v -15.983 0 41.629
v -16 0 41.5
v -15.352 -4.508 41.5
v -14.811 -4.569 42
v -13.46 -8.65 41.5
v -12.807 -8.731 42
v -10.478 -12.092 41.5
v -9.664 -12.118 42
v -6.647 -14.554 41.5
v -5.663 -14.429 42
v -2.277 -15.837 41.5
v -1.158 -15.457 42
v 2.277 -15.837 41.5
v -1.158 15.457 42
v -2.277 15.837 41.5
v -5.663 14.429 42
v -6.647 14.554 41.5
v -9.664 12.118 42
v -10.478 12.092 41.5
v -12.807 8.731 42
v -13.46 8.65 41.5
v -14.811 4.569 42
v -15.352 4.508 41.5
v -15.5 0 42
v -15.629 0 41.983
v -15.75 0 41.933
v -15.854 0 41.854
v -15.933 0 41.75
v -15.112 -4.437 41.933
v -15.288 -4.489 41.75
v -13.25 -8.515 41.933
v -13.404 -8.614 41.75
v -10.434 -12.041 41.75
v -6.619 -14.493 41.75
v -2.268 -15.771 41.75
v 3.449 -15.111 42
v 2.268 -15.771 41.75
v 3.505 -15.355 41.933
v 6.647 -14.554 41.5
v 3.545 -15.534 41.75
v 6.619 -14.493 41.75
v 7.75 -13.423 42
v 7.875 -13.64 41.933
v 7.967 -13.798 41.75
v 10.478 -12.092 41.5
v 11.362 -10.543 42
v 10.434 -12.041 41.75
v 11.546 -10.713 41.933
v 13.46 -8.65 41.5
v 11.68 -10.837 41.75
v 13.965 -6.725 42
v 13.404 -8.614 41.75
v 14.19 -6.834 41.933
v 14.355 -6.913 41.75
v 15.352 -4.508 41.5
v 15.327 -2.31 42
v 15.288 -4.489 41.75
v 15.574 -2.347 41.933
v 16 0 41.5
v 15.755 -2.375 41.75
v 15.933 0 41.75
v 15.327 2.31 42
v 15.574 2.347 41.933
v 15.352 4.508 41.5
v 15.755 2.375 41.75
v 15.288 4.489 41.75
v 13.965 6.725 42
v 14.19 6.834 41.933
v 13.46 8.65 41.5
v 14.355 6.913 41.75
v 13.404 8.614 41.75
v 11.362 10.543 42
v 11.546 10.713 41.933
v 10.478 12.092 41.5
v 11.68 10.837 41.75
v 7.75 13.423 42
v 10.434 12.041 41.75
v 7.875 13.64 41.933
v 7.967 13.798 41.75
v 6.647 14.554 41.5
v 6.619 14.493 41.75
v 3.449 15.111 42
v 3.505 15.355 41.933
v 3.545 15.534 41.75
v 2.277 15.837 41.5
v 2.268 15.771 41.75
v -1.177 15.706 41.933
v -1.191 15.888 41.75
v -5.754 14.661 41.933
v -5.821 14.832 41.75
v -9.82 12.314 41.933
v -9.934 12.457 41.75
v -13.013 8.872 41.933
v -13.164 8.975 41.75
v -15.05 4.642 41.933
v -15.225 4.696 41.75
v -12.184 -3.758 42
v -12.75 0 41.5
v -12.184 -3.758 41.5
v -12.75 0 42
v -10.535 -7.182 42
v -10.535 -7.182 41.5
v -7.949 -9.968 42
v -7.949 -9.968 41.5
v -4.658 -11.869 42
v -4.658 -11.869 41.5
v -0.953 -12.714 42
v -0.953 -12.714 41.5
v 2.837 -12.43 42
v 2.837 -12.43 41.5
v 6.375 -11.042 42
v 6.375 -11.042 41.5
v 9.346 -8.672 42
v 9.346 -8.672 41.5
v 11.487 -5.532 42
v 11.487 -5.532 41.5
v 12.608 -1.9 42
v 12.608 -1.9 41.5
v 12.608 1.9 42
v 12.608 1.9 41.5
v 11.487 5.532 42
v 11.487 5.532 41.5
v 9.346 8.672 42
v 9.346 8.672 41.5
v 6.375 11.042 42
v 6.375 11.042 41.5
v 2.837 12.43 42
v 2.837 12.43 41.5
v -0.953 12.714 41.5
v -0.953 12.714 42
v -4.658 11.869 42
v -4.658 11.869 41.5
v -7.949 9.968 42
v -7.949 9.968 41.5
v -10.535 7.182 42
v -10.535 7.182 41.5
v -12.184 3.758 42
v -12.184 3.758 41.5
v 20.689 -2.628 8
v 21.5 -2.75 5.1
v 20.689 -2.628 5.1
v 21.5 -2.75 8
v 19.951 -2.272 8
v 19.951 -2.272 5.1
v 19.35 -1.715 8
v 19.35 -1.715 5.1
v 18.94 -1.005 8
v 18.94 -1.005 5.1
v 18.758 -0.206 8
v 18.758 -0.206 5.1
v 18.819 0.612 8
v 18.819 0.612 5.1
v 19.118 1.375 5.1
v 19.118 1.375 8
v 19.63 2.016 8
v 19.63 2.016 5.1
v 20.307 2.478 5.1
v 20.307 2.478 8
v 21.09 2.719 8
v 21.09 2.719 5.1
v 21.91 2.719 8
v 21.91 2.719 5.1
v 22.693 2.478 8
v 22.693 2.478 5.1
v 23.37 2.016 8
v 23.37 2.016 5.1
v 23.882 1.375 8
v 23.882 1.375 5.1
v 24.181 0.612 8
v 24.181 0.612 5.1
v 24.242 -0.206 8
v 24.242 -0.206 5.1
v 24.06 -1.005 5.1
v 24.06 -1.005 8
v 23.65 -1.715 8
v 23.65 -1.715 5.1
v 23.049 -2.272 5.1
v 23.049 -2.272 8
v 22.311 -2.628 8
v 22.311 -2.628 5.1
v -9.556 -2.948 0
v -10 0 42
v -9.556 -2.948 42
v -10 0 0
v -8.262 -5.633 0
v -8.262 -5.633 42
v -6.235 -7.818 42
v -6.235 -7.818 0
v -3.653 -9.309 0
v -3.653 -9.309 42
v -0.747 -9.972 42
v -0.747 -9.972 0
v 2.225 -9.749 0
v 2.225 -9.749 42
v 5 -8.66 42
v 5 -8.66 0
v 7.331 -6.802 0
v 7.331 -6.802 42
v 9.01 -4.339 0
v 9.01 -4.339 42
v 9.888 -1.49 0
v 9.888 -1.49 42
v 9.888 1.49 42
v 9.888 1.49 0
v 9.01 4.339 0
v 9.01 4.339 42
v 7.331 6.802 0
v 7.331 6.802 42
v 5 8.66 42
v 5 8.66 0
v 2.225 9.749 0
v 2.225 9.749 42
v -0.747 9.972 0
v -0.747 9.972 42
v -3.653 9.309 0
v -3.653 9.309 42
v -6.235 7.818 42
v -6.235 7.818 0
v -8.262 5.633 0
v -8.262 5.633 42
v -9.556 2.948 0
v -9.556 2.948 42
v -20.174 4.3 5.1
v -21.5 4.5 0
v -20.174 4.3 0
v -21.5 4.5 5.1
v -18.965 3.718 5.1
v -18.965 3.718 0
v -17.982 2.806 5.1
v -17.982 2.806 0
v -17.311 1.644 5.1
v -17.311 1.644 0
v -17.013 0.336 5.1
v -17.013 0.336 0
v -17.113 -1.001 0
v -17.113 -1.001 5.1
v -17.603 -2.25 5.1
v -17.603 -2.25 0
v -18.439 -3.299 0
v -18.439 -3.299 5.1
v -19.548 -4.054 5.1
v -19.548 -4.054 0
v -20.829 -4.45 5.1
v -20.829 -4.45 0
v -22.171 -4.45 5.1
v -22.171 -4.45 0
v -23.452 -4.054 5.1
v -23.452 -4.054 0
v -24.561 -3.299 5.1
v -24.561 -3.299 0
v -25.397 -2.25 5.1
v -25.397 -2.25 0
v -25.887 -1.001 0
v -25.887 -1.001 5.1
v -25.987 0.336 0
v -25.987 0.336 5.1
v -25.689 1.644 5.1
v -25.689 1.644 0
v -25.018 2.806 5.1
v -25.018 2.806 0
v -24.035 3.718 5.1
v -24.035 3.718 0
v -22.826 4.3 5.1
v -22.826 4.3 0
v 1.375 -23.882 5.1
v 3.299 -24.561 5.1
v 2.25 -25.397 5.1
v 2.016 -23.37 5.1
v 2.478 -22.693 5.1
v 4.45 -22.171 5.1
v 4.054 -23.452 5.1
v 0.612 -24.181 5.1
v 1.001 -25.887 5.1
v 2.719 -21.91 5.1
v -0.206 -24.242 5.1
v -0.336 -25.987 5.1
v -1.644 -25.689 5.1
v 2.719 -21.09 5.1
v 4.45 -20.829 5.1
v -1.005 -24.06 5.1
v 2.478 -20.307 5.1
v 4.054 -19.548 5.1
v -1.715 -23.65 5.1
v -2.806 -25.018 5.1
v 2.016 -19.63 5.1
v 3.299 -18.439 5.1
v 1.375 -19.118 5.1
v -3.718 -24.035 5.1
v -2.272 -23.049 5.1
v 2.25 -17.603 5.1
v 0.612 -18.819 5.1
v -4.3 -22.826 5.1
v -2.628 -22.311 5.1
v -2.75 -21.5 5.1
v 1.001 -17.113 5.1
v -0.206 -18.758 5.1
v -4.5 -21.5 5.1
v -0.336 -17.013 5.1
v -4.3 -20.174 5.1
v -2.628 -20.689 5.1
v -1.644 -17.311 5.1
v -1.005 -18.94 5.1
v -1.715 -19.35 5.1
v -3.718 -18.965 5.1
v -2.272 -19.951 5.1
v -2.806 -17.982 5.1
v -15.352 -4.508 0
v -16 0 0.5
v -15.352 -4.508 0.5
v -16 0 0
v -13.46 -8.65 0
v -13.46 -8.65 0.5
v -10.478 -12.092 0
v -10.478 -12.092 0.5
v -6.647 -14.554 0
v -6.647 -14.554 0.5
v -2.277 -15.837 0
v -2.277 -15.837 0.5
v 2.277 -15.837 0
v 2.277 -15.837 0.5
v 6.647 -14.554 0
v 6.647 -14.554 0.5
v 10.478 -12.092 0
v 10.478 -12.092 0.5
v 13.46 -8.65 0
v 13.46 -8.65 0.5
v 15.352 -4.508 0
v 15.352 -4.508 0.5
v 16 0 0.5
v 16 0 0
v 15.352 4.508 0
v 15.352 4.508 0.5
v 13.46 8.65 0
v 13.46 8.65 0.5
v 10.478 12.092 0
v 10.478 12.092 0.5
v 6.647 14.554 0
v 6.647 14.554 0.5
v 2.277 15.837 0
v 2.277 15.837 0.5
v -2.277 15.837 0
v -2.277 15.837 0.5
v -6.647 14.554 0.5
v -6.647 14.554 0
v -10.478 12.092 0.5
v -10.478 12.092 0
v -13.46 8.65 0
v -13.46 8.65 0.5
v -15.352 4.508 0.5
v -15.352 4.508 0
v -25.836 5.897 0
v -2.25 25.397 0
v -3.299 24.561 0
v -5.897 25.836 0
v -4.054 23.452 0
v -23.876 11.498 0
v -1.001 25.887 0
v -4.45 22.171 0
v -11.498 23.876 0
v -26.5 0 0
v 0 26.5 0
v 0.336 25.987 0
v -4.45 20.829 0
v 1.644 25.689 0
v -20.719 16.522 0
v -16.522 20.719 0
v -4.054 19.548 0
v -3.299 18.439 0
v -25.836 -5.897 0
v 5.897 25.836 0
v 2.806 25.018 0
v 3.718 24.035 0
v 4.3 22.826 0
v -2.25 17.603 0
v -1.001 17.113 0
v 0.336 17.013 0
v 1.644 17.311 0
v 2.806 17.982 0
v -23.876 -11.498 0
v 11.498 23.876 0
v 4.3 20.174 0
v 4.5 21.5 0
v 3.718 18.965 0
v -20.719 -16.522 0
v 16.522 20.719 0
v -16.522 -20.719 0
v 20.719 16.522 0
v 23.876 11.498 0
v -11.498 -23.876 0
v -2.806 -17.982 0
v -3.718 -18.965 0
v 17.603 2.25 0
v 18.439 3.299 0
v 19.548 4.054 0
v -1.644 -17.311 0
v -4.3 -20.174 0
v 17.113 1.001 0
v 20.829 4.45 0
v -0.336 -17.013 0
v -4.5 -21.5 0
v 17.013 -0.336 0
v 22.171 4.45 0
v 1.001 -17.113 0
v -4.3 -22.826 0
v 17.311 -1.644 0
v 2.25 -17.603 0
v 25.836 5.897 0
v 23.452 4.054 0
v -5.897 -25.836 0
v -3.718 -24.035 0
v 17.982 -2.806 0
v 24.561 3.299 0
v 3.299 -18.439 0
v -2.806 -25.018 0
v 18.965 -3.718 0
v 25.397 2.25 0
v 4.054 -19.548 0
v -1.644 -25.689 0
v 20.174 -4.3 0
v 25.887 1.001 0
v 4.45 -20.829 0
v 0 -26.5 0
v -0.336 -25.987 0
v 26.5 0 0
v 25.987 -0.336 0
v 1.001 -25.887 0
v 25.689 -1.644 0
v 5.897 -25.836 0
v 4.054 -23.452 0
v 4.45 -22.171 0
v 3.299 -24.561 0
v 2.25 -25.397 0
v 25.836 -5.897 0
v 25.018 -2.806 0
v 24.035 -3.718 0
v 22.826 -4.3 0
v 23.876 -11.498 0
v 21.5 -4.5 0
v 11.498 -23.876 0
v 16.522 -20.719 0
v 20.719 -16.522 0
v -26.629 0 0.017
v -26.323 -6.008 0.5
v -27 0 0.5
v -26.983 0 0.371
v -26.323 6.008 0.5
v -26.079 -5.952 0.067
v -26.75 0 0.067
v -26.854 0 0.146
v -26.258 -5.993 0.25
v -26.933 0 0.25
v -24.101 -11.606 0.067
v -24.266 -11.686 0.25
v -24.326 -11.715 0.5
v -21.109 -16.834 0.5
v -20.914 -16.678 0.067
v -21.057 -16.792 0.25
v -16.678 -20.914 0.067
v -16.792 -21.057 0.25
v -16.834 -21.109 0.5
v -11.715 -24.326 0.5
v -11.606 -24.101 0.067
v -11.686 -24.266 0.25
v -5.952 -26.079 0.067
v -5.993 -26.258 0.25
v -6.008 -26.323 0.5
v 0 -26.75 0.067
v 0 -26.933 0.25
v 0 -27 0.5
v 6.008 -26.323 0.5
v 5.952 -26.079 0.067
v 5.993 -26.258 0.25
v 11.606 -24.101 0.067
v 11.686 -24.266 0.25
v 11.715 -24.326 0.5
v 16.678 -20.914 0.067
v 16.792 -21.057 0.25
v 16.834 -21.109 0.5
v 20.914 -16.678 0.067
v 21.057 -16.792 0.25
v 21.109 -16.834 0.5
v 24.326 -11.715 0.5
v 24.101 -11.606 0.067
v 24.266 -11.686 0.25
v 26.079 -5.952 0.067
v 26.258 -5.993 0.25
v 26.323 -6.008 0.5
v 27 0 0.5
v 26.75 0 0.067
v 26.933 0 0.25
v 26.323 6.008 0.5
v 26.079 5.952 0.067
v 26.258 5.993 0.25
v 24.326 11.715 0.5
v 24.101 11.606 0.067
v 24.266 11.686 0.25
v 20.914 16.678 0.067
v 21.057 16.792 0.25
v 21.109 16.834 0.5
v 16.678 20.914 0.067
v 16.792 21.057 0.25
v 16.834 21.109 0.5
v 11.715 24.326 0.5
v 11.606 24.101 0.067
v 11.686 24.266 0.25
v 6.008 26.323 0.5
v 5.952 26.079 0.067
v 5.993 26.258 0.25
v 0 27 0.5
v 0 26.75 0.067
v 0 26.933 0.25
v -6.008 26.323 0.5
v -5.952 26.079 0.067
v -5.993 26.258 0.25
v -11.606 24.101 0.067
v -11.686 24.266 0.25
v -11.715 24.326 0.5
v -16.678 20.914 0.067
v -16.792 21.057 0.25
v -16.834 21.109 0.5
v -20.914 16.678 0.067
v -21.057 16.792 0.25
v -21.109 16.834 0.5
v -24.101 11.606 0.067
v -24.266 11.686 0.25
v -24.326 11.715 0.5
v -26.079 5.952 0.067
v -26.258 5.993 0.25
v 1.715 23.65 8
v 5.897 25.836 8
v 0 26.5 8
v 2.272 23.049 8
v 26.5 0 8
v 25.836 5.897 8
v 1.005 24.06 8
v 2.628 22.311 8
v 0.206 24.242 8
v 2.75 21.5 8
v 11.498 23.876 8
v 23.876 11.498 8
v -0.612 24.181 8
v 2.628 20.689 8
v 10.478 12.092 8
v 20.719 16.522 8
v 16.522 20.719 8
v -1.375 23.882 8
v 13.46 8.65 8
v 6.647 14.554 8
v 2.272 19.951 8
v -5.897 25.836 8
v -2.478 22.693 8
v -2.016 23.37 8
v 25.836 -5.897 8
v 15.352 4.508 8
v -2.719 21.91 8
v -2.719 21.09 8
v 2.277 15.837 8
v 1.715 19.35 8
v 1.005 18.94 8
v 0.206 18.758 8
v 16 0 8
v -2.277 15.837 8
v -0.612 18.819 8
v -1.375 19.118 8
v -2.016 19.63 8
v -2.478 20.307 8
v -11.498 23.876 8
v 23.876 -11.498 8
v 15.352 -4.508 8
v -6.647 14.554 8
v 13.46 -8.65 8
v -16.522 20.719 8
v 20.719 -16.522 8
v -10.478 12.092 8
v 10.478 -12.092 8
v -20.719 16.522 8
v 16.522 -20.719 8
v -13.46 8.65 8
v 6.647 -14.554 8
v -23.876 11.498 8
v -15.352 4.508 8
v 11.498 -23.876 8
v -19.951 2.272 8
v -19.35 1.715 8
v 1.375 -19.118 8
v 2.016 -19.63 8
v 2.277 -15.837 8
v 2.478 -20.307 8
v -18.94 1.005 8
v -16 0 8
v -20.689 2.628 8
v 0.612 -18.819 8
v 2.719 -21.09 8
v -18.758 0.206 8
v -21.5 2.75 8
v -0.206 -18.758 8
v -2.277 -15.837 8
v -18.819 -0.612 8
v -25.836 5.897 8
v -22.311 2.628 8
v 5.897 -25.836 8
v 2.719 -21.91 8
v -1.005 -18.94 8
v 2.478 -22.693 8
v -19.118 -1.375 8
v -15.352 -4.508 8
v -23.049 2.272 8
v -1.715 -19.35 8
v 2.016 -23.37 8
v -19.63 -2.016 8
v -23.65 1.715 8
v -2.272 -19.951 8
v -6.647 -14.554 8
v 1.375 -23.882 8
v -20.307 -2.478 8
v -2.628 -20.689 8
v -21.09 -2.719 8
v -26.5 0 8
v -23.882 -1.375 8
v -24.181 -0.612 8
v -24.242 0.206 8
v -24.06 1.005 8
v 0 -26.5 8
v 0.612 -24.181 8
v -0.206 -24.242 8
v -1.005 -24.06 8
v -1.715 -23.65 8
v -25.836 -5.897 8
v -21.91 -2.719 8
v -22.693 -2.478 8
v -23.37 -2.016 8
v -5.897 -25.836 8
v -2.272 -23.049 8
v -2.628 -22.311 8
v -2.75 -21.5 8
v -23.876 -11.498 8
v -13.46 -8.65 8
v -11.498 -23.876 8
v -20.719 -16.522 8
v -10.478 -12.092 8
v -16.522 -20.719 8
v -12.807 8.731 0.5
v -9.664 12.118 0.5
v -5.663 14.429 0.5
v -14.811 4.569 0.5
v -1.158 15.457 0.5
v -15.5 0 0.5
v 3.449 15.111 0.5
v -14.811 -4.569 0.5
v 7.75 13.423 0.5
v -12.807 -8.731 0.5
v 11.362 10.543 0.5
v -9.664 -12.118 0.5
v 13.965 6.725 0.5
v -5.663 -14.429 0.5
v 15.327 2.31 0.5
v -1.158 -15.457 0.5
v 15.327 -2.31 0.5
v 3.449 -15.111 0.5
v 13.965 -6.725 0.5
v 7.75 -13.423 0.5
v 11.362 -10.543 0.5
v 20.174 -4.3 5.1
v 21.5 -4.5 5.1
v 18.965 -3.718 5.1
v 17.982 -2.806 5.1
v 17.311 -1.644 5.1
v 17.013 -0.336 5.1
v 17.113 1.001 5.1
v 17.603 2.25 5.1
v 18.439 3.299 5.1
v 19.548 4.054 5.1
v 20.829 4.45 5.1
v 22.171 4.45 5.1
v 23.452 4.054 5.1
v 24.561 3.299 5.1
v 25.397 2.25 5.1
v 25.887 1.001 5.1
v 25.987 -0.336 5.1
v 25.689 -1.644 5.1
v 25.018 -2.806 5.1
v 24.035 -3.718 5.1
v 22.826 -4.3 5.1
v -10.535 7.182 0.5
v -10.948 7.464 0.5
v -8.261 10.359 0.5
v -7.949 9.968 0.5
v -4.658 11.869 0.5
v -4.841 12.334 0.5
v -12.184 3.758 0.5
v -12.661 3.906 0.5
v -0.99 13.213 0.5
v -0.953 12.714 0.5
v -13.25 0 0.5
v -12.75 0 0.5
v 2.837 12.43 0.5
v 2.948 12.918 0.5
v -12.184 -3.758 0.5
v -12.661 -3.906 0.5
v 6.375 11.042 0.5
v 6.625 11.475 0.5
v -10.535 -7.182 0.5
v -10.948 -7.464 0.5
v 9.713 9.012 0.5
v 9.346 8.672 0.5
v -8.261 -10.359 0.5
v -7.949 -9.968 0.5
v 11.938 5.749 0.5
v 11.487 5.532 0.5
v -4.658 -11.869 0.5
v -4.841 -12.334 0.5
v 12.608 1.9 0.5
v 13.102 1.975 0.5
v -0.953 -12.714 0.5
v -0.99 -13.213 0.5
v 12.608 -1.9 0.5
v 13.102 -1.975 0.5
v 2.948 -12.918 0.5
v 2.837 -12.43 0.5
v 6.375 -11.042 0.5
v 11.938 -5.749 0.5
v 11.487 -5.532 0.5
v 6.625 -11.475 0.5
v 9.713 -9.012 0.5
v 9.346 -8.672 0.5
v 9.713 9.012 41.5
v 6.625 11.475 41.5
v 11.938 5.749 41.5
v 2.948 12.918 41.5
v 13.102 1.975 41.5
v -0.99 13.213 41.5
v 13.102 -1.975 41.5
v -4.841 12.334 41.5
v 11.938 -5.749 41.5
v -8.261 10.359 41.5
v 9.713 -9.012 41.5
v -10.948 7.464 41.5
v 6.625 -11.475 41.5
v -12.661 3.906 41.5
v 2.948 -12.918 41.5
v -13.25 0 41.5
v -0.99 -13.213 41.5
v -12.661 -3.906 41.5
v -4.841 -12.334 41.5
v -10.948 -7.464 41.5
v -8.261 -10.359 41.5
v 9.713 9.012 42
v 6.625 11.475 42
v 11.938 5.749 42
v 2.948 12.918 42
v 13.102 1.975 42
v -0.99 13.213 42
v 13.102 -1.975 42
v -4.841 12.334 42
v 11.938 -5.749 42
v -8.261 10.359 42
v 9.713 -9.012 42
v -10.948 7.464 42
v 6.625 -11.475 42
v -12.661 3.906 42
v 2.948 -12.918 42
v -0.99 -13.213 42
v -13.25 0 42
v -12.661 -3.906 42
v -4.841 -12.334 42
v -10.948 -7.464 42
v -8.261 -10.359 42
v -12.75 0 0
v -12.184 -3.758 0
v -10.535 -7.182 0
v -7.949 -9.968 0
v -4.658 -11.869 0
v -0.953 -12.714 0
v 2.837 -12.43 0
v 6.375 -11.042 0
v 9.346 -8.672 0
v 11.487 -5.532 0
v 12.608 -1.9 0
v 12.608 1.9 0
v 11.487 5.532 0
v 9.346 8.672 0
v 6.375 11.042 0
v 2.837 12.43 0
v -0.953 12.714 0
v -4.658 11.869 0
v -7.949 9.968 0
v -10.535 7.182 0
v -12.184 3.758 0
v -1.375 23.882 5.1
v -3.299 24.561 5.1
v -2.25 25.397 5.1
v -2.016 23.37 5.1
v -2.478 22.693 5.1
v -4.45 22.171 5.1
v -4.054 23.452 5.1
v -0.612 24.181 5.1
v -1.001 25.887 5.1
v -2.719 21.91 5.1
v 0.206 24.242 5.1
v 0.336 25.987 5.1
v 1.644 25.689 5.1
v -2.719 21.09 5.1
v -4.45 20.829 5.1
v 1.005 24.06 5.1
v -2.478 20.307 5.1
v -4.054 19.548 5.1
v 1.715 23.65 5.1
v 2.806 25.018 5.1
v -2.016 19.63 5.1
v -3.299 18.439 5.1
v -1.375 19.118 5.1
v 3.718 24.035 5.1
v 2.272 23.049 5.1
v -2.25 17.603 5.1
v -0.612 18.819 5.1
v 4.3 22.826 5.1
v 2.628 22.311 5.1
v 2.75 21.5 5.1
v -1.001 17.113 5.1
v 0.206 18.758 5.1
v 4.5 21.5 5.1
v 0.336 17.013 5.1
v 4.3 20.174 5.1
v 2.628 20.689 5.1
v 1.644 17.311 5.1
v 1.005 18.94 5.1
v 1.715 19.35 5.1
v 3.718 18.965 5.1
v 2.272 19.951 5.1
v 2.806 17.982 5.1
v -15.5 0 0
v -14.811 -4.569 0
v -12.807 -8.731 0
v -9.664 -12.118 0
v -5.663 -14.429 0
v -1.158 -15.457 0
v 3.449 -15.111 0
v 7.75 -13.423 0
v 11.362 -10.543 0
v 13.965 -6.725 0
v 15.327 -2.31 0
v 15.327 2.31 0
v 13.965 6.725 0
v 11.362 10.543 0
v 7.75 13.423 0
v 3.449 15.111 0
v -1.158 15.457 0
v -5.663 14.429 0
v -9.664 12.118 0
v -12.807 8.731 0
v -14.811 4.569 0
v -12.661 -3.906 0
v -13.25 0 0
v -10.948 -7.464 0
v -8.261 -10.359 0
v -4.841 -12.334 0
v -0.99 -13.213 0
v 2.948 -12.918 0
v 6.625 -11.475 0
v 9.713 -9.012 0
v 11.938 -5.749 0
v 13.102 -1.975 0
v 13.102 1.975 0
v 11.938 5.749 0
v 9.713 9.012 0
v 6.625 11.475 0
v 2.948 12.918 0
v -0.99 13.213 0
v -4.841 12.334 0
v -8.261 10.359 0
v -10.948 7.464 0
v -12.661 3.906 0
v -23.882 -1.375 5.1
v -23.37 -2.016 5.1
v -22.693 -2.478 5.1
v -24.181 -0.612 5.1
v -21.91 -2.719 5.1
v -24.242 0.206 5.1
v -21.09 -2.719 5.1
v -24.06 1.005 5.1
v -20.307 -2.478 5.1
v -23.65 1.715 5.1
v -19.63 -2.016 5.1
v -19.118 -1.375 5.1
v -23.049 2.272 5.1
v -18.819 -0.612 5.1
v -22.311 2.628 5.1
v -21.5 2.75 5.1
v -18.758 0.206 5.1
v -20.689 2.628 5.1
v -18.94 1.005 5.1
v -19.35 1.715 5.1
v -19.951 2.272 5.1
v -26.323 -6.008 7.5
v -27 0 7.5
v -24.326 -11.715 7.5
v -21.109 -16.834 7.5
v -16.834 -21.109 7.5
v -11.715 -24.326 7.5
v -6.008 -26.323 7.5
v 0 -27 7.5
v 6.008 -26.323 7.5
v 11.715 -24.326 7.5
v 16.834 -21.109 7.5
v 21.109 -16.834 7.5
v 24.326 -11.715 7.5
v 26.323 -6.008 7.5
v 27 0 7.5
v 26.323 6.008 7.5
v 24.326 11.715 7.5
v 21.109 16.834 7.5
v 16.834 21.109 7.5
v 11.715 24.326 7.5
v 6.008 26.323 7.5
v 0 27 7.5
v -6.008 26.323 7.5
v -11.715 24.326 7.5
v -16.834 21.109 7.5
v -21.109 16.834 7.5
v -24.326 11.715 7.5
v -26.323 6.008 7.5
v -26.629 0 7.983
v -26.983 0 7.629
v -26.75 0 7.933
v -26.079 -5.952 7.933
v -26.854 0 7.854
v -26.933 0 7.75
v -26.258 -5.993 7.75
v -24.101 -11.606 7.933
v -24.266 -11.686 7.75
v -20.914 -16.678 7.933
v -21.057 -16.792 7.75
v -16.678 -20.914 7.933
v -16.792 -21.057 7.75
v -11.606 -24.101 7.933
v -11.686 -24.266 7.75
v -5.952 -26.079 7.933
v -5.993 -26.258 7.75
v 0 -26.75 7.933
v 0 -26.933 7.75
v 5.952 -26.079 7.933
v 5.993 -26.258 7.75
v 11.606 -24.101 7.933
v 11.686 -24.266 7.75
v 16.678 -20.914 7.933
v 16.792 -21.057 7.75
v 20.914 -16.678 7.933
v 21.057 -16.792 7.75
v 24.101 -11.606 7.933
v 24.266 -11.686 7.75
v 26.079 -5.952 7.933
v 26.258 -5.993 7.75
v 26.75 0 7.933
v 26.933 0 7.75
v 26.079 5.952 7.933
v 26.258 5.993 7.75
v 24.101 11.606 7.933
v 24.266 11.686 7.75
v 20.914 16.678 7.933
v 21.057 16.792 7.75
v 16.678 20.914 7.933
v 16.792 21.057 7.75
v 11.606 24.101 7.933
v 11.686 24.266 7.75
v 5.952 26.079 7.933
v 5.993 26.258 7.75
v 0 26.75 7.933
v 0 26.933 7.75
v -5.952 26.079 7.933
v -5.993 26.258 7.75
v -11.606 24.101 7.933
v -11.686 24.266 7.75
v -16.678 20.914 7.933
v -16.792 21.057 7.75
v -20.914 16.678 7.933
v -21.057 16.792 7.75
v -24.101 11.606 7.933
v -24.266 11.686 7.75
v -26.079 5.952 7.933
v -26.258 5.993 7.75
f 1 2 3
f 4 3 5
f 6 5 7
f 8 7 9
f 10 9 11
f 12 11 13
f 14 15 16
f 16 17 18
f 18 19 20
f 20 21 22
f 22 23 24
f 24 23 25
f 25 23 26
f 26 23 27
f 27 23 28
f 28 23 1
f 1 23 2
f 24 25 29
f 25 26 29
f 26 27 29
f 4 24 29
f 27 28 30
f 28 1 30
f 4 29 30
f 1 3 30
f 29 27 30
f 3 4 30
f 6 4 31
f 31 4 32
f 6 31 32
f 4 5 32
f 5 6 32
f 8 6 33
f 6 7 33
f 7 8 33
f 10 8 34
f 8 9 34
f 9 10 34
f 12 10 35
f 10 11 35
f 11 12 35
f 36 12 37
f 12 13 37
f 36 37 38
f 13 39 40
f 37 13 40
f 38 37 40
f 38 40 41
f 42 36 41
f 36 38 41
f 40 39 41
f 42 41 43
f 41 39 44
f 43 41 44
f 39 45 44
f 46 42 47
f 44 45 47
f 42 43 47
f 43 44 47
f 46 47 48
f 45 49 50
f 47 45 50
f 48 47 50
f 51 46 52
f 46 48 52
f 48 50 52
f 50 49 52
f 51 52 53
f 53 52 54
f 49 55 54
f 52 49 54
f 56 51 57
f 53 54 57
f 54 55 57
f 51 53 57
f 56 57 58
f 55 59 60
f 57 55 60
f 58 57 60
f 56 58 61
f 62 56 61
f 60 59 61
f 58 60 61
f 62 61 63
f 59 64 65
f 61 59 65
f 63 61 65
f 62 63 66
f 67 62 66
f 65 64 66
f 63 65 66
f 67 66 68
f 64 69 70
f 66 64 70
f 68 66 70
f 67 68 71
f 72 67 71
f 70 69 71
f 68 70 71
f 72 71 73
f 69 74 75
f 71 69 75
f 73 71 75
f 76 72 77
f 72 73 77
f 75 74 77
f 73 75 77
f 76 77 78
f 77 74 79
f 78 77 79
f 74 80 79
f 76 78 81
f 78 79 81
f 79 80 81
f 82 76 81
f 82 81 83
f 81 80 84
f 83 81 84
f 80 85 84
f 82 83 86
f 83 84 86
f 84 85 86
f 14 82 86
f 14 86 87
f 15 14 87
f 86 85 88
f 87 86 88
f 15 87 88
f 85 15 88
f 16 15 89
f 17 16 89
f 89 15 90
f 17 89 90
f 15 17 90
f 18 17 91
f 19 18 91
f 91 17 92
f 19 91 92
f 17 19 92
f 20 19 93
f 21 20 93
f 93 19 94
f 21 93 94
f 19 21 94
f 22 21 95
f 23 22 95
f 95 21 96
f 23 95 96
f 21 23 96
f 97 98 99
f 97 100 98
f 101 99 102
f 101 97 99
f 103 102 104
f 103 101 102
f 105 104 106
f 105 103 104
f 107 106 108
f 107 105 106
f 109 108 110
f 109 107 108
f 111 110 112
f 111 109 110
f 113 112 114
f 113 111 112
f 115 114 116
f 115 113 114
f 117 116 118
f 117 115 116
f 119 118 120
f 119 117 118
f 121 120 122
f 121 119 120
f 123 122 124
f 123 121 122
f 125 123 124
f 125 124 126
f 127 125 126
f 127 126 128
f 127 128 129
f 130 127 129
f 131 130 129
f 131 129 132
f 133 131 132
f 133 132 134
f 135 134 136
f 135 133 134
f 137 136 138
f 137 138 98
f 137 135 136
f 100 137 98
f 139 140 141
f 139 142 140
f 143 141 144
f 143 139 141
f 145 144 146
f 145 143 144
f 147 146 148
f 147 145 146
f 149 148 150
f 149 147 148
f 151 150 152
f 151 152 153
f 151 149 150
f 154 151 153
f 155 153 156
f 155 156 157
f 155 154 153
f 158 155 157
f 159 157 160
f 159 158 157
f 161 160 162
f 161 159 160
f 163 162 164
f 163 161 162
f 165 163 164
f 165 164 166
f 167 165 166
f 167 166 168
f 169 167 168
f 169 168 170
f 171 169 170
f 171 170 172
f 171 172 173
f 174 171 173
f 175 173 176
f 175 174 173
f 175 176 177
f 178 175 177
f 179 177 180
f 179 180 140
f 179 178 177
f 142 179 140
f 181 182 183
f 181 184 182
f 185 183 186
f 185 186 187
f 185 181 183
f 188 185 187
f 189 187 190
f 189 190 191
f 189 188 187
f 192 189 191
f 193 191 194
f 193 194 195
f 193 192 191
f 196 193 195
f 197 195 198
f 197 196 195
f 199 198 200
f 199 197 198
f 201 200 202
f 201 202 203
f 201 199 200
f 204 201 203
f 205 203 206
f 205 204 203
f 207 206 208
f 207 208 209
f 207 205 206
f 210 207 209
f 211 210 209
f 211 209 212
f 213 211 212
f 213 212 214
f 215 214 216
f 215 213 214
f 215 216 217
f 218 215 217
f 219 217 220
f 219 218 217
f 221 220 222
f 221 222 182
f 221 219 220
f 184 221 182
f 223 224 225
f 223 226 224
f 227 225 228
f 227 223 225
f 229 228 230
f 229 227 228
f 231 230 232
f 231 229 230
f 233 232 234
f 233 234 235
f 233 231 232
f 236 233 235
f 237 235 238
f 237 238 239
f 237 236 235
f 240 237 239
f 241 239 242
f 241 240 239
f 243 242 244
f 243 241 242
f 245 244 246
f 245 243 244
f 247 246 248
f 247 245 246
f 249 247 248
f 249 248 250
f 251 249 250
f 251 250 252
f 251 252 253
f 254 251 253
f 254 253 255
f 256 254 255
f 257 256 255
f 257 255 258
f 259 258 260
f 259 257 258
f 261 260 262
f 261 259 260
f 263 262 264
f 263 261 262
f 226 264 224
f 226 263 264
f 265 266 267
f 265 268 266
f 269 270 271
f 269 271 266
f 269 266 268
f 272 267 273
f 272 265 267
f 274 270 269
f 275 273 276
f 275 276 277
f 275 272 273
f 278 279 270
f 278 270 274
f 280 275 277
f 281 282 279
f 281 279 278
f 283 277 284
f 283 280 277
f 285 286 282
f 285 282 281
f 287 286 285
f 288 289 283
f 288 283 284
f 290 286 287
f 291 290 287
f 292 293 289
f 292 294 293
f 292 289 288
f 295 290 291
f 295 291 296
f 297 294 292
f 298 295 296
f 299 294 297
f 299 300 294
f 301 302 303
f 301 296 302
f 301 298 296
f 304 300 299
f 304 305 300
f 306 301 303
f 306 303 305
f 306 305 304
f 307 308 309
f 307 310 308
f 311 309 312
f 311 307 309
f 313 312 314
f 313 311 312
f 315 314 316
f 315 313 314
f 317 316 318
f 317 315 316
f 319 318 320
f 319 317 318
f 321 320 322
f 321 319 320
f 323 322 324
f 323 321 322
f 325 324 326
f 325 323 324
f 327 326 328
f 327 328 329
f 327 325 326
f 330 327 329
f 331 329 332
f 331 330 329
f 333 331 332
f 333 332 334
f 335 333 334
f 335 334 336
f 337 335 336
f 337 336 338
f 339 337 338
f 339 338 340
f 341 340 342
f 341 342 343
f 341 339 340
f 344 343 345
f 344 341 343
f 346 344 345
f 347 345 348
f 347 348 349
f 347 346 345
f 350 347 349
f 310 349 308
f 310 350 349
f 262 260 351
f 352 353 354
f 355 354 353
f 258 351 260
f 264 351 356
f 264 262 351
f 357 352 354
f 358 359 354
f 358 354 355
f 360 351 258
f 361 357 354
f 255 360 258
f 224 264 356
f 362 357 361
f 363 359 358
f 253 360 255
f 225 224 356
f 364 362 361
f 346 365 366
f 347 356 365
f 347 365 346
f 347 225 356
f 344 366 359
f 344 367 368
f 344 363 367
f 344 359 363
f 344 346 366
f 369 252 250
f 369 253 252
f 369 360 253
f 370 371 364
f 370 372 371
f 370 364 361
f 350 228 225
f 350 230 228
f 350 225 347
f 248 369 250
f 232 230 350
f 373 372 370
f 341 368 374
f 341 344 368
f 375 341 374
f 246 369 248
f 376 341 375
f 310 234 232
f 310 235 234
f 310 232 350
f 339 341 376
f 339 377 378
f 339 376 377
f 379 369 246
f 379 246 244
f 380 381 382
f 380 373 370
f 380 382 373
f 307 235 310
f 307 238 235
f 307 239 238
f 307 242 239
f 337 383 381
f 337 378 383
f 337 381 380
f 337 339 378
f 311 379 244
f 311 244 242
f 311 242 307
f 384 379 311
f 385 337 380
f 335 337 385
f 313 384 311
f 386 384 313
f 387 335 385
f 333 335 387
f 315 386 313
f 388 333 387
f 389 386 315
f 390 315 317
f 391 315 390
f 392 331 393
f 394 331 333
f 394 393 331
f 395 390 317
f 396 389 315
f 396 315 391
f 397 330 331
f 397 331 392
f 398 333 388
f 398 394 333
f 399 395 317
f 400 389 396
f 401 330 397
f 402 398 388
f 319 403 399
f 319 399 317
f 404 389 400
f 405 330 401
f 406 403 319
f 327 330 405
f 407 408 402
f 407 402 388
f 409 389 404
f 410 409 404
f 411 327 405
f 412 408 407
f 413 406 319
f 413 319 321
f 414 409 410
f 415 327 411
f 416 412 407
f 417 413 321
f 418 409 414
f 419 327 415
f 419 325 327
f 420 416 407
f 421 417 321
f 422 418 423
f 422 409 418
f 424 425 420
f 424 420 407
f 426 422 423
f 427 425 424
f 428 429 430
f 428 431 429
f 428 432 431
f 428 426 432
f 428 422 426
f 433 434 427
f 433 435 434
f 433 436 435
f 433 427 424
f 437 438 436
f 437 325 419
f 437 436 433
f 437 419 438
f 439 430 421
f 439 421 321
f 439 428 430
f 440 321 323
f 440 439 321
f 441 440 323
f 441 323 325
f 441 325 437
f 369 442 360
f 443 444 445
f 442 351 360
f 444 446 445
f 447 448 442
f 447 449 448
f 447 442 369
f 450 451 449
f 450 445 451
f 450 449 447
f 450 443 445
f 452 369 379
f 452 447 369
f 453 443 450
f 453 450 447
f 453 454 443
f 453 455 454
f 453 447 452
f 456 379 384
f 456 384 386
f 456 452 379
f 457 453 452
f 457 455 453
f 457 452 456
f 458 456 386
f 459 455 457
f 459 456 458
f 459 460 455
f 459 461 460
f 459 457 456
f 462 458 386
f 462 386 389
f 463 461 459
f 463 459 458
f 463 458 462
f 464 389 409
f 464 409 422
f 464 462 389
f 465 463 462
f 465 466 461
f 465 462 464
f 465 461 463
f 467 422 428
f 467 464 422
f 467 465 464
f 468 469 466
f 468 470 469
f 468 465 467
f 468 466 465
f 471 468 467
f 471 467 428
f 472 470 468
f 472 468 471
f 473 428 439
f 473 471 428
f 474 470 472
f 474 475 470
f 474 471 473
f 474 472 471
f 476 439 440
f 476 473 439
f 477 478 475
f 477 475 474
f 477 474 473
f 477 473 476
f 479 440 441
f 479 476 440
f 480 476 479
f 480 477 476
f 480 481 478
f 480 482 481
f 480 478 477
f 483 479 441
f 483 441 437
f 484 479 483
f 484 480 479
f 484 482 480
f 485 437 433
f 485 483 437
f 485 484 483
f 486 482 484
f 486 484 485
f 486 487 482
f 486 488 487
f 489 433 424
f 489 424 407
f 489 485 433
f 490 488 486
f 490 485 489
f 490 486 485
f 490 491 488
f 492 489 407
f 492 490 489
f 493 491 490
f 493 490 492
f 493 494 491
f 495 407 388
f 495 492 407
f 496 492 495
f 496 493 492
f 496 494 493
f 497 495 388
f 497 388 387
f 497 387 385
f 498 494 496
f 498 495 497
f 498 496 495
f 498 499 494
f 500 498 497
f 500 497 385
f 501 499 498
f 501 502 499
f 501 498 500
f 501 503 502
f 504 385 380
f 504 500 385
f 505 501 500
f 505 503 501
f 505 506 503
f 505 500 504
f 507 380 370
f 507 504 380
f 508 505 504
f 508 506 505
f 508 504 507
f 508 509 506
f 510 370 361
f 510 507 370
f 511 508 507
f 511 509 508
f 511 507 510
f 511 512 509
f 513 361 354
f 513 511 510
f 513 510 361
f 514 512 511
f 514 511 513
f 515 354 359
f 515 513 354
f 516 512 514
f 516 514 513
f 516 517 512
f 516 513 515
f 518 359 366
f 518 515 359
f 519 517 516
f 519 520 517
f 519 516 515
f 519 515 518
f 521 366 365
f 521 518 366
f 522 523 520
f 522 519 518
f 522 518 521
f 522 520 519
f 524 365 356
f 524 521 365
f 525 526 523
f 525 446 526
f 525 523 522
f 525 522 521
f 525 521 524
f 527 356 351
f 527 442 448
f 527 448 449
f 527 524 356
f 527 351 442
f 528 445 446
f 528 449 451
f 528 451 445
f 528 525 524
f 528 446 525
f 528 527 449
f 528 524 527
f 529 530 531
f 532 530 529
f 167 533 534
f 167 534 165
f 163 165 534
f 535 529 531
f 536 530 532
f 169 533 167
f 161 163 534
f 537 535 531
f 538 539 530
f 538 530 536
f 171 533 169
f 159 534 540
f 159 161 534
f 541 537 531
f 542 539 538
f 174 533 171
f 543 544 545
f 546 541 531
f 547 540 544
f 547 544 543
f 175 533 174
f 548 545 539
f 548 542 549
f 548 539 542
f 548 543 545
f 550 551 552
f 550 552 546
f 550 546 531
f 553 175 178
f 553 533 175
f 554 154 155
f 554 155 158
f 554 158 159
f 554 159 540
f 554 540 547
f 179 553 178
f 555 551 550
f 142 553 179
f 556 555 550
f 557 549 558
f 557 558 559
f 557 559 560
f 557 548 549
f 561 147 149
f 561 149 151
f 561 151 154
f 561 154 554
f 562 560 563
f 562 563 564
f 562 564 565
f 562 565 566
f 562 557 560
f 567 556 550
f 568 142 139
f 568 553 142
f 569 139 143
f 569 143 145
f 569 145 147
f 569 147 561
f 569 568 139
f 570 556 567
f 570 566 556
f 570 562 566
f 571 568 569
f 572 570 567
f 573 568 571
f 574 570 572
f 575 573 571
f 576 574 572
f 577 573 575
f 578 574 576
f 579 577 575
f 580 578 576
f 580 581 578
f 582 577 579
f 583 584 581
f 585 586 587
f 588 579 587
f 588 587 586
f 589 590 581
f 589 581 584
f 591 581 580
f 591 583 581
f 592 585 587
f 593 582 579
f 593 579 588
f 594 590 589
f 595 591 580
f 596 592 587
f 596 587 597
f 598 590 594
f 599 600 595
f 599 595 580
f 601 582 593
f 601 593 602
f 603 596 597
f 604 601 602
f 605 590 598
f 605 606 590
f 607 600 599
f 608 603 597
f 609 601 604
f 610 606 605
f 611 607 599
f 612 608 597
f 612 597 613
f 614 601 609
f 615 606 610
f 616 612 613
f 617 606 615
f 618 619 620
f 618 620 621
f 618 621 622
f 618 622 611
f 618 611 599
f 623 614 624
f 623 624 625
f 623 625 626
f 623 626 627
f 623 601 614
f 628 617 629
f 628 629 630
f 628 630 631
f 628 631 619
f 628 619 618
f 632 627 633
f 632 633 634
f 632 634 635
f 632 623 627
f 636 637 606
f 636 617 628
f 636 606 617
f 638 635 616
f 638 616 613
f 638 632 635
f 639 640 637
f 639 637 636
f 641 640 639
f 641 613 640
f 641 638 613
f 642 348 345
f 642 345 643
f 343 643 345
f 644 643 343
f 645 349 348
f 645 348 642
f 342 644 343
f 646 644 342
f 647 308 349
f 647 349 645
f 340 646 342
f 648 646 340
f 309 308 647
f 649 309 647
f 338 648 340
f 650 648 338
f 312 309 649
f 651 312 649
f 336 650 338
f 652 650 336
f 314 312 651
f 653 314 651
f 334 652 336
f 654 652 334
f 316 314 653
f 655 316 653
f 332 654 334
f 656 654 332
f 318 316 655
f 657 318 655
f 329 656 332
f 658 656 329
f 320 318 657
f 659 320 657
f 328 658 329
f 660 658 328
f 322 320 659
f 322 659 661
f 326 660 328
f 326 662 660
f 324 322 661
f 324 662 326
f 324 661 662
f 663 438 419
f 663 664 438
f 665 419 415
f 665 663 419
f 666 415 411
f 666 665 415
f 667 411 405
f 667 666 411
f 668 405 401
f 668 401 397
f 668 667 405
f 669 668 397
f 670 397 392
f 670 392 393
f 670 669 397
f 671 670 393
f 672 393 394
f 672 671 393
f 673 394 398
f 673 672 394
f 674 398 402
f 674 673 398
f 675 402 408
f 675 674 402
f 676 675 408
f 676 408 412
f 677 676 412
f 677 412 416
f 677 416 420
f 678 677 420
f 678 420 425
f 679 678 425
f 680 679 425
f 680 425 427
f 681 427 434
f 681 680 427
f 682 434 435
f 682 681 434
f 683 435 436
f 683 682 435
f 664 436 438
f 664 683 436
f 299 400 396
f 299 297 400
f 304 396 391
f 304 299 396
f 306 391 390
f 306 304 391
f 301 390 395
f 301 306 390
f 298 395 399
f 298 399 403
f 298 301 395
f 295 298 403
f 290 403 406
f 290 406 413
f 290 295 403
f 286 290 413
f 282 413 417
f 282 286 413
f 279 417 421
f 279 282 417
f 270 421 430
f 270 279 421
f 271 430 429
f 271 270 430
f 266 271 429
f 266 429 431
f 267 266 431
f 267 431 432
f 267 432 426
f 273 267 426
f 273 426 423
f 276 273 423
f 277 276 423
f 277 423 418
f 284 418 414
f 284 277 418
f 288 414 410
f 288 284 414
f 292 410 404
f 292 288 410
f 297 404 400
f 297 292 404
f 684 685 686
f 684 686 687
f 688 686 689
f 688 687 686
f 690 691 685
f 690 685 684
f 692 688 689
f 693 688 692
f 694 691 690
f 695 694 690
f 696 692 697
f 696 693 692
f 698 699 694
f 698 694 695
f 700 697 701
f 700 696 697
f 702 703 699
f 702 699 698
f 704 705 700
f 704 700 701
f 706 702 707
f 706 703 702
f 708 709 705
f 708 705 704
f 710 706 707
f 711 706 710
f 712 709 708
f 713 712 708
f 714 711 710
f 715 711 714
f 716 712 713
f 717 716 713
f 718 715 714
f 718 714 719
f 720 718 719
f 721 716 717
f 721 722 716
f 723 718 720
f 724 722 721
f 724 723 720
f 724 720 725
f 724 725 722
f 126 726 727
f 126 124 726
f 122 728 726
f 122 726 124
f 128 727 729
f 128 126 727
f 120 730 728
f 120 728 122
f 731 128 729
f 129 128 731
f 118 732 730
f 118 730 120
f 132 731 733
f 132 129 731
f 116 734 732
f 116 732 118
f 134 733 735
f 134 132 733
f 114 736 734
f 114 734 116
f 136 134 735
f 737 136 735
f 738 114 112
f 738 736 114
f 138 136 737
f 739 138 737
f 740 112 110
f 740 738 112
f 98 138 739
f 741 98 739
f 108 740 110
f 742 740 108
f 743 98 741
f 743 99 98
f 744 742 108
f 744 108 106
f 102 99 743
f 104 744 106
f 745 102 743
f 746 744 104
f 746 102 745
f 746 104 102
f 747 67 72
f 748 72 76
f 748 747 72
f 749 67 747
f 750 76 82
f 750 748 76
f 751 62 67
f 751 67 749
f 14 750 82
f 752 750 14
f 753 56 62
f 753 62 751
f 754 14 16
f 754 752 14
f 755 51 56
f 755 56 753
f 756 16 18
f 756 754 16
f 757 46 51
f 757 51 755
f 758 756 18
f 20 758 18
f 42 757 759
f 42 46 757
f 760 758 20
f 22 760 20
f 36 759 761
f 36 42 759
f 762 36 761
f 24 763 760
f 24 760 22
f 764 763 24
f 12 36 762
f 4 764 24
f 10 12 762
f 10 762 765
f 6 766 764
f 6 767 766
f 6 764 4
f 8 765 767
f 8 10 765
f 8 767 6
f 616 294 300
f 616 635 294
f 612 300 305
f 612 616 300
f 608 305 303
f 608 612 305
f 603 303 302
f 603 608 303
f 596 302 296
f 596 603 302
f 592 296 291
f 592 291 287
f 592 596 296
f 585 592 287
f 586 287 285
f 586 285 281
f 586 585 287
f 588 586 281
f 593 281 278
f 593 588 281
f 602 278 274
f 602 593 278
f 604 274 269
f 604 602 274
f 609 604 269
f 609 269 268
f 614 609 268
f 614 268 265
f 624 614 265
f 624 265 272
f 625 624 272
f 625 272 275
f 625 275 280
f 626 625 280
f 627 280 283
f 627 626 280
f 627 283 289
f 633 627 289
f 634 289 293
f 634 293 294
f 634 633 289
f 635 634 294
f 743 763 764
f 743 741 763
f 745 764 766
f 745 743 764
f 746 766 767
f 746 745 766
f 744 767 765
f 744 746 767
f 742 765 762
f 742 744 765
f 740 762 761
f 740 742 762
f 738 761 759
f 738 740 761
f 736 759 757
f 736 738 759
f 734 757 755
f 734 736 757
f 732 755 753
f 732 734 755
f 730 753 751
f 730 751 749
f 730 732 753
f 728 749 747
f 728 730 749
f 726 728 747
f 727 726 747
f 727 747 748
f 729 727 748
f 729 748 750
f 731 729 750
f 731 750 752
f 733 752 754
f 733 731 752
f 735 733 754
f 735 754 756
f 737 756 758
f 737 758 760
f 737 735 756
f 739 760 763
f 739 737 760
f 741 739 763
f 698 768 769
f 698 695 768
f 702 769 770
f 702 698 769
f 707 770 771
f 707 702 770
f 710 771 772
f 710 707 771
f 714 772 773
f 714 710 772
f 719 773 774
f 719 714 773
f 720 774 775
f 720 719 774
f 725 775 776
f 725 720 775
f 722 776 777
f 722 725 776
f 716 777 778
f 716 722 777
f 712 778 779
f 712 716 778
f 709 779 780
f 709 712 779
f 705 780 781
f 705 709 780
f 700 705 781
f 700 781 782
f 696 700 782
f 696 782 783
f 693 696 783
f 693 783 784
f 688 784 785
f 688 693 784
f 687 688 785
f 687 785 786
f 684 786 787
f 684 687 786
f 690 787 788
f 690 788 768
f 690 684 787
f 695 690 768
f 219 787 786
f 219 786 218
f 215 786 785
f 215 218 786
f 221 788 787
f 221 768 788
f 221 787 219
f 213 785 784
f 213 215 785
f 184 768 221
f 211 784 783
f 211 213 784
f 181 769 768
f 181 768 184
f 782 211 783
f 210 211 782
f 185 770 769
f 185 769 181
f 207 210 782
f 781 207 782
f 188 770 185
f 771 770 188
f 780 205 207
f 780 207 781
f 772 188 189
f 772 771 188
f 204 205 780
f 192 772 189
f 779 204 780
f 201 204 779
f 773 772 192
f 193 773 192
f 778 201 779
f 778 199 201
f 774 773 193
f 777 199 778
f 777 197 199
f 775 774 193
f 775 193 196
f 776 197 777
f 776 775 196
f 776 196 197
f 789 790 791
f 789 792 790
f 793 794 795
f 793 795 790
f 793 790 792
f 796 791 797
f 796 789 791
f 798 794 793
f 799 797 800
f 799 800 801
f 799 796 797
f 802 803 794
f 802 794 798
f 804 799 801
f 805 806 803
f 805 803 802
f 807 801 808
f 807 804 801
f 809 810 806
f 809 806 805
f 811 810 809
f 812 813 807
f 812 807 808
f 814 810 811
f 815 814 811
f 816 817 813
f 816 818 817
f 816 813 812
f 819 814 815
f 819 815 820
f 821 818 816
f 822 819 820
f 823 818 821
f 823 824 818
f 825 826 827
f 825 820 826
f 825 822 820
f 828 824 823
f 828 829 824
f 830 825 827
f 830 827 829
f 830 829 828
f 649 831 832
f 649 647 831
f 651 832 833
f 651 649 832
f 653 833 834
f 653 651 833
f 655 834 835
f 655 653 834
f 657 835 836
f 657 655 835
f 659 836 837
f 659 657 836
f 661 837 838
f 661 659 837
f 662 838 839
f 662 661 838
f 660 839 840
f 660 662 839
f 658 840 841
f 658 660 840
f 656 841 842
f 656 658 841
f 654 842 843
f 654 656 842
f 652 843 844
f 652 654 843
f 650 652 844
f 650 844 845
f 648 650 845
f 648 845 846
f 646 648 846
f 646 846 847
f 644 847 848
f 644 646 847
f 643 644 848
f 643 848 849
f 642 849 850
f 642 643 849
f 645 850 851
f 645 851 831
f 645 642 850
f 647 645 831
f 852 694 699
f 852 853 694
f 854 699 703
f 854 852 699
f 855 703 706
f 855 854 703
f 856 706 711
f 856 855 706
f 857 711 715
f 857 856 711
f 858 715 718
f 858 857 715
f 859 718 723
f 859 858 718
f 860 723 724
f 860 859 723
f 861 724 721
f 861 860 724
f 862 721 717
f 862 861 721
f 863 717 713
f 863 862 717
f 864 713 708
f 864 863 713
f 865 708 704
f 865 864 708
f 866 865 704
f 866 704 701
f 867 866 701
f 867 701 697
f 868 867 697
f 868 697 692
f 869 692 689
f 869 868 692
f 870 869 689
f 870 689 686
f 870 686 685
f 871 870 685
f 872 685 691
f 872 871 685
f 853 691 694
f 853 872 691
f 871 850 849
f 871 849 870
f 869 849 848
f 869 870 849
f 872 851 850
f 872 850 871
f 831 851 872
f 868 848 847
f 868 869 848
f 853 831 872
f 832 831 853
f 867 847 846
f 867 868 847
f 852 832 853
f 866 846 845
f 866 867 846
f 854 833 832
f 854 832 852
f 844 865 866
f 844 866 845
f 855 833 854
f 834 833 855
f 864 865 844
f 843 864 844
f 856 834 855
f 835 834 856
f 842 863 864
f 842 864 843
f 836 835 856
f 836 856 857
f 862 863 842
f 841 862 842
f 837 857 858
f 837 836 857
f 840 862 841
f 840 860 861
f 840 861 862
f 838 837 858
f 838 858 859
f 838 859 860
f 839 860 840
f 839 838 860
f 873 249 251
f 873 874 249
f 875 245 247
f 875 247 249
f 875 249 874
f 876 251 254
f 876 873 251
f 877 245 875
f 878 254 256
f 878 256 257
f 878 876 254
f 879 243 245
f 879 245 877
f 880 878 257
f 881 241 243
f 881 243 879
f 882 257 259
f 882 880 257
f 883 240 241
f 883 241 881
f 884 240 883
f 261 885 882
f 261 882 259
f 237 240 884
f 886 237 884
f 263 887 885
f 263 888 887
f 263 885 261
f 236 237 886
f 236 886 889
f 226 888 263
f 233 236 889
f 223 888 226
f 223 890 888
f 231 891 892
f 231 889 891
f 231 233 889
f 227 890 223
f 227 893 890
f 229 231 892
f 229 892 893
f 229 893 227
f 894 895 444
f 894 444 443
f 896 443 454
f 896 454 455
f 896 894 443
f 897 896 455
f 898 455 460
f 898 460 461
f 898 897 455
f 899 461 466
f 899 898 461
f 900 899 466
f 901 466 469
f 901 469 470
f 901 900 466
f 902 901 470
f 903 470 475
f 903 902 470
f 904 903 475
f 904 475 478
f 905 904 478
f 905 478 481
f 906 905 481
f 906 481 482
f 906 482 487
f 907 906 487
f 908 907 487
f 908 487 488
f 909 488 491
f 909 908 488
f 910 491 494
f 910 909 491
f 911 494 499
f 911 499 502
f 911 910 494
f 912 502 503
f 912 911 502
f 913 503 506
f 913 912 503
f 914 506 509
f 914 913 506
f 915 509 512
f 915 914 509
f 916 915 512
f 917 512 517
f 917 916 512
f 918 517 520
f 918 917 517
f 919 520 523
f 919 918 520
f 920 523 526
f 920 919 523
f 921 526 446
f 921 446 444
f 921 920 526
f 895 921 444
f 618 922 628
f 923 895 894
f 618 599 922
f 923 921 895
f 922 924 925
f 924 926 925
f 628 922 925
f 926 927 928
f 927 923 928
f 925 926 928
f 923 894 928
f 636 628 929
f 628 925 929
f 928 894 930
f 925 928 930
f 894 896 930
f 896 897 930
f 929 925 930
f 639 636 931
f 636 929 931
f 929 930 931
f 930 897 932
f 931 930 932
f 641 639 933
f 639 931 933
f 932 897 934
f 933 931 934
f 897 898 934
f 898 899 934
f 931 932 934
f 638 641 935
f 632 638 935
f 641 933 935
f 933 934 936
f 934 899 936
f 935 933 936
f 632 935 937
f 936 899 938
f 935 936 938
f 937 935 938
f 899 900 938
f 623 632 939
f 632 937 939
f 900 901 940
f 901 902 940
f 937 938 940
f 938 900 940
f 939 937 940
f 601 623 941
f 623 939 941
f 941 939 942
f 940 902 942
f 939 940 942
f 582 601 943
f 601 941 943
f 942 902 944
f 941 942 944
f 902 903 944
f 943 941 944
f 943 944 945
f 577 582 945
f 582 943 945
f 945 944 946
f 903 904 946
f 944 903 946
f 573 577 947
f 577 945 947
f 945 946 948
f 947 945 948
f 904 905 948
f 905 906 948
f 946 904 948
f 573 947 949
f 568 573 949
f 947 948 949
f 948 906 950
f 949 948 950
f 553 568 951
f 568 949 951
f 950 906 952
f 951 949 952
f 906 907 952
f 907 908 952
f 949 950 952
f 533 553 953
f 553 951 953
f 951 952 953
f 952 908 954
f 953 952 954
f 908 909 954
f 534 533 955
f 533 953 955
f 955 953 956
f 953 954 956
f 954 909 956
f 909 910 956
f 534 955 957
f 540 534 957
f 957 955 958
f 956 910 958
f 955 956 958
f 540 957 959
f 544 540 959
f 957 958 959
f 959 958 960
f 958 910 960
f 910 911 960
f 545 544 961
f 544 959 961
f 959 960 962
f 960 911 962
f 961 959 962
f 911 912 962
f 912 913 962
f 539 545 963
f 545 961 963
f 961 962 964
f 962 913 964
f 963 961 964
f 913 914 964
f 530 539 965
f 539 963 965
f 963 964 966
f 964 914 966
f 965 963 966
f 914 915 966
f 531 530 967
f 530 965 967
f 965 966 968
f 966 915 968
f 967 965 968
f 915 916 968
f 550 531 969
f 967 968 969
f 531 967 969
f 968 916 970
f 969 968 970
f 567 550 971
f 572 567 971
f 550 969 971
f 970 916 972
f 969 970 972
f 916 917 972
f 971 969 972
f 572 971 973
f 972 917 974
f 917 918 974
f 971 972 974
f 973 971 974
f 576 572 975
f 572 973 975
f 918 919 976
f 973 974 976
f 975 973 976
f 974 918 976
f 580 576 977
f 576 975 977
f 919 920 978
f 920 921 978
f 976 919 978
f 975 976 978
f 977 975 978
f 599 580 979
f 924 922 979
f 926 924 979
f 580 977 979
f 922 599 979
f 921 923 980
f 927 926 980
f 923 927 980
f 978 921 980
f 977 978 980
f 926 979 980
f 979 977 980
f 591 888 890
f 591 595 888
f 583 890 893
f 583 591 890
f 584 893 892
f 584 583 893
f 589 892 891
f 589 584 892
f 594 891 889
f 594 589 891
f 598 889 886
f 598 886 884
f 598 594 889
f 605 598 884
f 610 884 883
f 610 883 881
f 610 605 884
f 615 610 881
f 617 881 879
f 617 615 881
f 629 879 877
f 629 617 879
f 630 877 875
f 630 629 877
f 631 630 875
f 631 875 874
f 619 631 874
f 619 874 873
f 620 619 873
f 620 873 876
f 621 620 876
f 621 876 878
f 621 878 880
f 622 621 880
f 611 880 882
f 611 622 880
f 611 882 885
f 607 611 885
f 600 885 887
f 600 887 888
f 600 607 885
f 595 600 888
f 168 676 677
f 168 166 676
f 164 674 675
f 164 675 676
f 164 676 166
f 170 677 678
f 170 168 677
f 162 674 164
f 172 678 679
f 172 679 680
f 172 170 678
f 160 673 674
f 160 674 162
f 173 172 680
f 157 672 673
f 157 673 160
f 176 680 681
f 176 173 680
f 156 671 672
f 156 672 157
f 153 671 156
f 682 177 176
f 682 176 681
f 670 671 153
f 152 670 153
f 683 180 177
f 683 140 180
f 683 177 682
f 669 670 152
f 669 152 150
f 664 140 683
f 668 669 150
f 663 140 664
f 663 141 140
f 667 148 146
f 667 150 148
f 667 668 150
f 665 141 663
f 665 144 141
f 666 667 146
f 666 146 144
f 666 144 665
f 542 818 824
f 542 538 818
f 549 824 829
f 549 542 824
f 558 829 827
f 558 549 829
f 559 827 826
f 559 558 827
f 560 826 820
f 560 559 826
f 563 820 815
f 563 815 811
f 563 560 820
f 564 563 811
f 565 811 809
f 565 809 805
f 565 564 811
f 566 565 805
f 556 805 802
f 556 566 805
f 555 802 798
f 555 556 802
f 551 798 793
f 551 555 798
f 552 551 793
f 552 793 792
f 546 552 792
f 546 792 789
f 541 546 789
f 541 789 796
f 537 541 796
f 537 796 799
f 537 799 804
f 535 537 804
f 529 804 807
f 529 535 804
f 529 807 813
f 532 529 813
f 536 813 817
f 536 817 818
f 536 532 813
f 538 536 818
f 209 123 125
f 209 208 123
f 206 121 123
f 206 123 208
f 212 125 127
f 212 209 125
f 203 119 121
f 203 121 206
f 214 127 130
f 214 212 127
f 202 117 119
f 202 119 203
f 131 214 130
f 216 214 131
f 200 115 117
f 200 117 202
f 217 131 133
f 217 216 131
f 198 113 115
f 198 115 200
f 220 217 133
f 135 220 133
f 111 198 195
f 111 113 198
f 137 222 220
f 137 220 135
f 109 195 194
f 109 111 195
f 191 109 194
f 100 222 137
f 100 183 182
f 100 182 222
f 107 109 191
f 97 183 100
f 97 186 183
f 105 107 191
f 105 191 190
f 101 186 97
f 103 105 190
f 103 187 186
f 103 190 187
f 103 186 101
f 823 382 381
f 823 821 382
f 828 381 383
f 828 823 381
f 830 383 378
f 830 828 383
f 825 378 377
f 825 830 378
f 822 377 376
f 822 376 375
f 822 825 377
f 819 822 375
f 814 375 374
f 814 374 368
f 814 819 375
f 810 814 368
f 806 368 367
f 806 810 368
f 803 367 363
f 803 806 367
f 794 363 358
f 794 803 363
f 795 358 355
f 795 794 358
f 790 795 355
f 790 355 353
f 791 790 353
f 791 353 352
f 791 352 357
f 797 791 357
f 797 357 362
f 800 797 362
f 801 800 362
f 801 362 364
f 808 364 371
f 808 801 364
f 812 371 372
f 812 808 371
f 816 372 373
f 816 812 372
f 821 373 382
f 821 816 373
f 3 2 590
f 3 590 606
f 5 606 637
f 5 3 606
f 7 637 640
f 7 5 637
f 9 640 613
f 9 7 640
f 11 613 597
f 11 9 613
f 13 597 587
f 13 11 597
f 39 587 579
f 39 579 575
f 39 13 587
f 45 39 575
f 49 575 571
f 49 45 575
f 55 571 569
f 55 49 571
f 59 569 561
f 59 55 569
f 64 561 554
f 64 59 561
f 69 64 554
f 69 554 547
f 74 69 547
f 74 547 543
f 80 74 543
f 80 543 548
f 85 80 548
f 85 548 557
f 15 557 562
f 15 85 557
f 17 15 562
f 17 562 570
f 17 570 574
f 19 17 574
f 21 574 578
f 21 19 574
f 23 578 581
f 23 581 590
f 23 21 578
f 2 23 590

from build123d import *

# Parameters (mm, degrees)
PADR_OCIRCULAR1_COUNT = 4
FILETE1_R             = 0.5


with BuildPart() as part:
    # Esboço1 → Revolução1 (revolve)
    with BuildSketch(Plane(origin=(0, 0, 0), x_dir=(0, 0, -1), z_dir=(1, 0, 0)), mode=Mode.PRIVATE) as revolu_o1_sk:
        Polygon((0, 10), (0, 12.75), (-0.5, 12.75), (-0.5, 13.25), (0, 13.25), (0, 15.5), (-0.5, 15.5), (-0.5, 16), (0, 16), (0, 27), (-8, 27), (-8, 16), (-42, 16), (-42, 13.25), (-41.5, 13.25), (-41.5, 12.75), (-42, 12.75), (-42, 10), align=None)
    revolve(revolu_o1_sk.sketch.rotate(Axis((0, 0, 0), (0, 0, 1)), 90), axis=Axis((0, 0, 0), (0, 0, 1)))  # turned: the seam where the file's is

    # Esboço5 → Corte-Revolução1 (revolve, cut)
    with BuildSketch(Plane(origin=(0, 0, 0), x_dir=(0, 0, -1), z_dir=(1, 0, 0)), mode=Mode.PRIVATE) as corte_revolu_o1_sk:
        Polygon((0, 26), (-5.1, 26), (-5.1, 24.25), (-8, 24.25), (-8, 21.5), (0, 21.5), align=None)
    corte_revolu_o1 = revolve(corte_revolu_o1_sk.sketch.rotate(Axis((0, 21.5, 0), (0, 0, -1)), 90), axis=Axis((0, 21.5, 0), (0, 0, -1)), mode=Mode.SUBTRACT)  # turned: the seam where the file's is

    # PadrãoCircular1: Corte-Revolução1 ×4 about axis
    padr_ocircular1_axis = Axis((0, 0, 0), (0, 0, 1))
    for i in range(1, PADR_OCIRCULAR1_COUNT):
        add(corte_revolu_o1.rotate(padr_ocircular1_axis, i * 360 / PADR_OCIRCULAR1_COUNT), mode=Mode.SUBTRACT)

    # Filete1
    filete1_edges = [part.edges().sort_by_distance(p)[0] for p in [
        (16, 0, 42),
        (27, 0, 8),
        (27, 0, 0),
    ]]
    fillet(filete1_edges, radius=FILETE1_R)


solid = part.part
